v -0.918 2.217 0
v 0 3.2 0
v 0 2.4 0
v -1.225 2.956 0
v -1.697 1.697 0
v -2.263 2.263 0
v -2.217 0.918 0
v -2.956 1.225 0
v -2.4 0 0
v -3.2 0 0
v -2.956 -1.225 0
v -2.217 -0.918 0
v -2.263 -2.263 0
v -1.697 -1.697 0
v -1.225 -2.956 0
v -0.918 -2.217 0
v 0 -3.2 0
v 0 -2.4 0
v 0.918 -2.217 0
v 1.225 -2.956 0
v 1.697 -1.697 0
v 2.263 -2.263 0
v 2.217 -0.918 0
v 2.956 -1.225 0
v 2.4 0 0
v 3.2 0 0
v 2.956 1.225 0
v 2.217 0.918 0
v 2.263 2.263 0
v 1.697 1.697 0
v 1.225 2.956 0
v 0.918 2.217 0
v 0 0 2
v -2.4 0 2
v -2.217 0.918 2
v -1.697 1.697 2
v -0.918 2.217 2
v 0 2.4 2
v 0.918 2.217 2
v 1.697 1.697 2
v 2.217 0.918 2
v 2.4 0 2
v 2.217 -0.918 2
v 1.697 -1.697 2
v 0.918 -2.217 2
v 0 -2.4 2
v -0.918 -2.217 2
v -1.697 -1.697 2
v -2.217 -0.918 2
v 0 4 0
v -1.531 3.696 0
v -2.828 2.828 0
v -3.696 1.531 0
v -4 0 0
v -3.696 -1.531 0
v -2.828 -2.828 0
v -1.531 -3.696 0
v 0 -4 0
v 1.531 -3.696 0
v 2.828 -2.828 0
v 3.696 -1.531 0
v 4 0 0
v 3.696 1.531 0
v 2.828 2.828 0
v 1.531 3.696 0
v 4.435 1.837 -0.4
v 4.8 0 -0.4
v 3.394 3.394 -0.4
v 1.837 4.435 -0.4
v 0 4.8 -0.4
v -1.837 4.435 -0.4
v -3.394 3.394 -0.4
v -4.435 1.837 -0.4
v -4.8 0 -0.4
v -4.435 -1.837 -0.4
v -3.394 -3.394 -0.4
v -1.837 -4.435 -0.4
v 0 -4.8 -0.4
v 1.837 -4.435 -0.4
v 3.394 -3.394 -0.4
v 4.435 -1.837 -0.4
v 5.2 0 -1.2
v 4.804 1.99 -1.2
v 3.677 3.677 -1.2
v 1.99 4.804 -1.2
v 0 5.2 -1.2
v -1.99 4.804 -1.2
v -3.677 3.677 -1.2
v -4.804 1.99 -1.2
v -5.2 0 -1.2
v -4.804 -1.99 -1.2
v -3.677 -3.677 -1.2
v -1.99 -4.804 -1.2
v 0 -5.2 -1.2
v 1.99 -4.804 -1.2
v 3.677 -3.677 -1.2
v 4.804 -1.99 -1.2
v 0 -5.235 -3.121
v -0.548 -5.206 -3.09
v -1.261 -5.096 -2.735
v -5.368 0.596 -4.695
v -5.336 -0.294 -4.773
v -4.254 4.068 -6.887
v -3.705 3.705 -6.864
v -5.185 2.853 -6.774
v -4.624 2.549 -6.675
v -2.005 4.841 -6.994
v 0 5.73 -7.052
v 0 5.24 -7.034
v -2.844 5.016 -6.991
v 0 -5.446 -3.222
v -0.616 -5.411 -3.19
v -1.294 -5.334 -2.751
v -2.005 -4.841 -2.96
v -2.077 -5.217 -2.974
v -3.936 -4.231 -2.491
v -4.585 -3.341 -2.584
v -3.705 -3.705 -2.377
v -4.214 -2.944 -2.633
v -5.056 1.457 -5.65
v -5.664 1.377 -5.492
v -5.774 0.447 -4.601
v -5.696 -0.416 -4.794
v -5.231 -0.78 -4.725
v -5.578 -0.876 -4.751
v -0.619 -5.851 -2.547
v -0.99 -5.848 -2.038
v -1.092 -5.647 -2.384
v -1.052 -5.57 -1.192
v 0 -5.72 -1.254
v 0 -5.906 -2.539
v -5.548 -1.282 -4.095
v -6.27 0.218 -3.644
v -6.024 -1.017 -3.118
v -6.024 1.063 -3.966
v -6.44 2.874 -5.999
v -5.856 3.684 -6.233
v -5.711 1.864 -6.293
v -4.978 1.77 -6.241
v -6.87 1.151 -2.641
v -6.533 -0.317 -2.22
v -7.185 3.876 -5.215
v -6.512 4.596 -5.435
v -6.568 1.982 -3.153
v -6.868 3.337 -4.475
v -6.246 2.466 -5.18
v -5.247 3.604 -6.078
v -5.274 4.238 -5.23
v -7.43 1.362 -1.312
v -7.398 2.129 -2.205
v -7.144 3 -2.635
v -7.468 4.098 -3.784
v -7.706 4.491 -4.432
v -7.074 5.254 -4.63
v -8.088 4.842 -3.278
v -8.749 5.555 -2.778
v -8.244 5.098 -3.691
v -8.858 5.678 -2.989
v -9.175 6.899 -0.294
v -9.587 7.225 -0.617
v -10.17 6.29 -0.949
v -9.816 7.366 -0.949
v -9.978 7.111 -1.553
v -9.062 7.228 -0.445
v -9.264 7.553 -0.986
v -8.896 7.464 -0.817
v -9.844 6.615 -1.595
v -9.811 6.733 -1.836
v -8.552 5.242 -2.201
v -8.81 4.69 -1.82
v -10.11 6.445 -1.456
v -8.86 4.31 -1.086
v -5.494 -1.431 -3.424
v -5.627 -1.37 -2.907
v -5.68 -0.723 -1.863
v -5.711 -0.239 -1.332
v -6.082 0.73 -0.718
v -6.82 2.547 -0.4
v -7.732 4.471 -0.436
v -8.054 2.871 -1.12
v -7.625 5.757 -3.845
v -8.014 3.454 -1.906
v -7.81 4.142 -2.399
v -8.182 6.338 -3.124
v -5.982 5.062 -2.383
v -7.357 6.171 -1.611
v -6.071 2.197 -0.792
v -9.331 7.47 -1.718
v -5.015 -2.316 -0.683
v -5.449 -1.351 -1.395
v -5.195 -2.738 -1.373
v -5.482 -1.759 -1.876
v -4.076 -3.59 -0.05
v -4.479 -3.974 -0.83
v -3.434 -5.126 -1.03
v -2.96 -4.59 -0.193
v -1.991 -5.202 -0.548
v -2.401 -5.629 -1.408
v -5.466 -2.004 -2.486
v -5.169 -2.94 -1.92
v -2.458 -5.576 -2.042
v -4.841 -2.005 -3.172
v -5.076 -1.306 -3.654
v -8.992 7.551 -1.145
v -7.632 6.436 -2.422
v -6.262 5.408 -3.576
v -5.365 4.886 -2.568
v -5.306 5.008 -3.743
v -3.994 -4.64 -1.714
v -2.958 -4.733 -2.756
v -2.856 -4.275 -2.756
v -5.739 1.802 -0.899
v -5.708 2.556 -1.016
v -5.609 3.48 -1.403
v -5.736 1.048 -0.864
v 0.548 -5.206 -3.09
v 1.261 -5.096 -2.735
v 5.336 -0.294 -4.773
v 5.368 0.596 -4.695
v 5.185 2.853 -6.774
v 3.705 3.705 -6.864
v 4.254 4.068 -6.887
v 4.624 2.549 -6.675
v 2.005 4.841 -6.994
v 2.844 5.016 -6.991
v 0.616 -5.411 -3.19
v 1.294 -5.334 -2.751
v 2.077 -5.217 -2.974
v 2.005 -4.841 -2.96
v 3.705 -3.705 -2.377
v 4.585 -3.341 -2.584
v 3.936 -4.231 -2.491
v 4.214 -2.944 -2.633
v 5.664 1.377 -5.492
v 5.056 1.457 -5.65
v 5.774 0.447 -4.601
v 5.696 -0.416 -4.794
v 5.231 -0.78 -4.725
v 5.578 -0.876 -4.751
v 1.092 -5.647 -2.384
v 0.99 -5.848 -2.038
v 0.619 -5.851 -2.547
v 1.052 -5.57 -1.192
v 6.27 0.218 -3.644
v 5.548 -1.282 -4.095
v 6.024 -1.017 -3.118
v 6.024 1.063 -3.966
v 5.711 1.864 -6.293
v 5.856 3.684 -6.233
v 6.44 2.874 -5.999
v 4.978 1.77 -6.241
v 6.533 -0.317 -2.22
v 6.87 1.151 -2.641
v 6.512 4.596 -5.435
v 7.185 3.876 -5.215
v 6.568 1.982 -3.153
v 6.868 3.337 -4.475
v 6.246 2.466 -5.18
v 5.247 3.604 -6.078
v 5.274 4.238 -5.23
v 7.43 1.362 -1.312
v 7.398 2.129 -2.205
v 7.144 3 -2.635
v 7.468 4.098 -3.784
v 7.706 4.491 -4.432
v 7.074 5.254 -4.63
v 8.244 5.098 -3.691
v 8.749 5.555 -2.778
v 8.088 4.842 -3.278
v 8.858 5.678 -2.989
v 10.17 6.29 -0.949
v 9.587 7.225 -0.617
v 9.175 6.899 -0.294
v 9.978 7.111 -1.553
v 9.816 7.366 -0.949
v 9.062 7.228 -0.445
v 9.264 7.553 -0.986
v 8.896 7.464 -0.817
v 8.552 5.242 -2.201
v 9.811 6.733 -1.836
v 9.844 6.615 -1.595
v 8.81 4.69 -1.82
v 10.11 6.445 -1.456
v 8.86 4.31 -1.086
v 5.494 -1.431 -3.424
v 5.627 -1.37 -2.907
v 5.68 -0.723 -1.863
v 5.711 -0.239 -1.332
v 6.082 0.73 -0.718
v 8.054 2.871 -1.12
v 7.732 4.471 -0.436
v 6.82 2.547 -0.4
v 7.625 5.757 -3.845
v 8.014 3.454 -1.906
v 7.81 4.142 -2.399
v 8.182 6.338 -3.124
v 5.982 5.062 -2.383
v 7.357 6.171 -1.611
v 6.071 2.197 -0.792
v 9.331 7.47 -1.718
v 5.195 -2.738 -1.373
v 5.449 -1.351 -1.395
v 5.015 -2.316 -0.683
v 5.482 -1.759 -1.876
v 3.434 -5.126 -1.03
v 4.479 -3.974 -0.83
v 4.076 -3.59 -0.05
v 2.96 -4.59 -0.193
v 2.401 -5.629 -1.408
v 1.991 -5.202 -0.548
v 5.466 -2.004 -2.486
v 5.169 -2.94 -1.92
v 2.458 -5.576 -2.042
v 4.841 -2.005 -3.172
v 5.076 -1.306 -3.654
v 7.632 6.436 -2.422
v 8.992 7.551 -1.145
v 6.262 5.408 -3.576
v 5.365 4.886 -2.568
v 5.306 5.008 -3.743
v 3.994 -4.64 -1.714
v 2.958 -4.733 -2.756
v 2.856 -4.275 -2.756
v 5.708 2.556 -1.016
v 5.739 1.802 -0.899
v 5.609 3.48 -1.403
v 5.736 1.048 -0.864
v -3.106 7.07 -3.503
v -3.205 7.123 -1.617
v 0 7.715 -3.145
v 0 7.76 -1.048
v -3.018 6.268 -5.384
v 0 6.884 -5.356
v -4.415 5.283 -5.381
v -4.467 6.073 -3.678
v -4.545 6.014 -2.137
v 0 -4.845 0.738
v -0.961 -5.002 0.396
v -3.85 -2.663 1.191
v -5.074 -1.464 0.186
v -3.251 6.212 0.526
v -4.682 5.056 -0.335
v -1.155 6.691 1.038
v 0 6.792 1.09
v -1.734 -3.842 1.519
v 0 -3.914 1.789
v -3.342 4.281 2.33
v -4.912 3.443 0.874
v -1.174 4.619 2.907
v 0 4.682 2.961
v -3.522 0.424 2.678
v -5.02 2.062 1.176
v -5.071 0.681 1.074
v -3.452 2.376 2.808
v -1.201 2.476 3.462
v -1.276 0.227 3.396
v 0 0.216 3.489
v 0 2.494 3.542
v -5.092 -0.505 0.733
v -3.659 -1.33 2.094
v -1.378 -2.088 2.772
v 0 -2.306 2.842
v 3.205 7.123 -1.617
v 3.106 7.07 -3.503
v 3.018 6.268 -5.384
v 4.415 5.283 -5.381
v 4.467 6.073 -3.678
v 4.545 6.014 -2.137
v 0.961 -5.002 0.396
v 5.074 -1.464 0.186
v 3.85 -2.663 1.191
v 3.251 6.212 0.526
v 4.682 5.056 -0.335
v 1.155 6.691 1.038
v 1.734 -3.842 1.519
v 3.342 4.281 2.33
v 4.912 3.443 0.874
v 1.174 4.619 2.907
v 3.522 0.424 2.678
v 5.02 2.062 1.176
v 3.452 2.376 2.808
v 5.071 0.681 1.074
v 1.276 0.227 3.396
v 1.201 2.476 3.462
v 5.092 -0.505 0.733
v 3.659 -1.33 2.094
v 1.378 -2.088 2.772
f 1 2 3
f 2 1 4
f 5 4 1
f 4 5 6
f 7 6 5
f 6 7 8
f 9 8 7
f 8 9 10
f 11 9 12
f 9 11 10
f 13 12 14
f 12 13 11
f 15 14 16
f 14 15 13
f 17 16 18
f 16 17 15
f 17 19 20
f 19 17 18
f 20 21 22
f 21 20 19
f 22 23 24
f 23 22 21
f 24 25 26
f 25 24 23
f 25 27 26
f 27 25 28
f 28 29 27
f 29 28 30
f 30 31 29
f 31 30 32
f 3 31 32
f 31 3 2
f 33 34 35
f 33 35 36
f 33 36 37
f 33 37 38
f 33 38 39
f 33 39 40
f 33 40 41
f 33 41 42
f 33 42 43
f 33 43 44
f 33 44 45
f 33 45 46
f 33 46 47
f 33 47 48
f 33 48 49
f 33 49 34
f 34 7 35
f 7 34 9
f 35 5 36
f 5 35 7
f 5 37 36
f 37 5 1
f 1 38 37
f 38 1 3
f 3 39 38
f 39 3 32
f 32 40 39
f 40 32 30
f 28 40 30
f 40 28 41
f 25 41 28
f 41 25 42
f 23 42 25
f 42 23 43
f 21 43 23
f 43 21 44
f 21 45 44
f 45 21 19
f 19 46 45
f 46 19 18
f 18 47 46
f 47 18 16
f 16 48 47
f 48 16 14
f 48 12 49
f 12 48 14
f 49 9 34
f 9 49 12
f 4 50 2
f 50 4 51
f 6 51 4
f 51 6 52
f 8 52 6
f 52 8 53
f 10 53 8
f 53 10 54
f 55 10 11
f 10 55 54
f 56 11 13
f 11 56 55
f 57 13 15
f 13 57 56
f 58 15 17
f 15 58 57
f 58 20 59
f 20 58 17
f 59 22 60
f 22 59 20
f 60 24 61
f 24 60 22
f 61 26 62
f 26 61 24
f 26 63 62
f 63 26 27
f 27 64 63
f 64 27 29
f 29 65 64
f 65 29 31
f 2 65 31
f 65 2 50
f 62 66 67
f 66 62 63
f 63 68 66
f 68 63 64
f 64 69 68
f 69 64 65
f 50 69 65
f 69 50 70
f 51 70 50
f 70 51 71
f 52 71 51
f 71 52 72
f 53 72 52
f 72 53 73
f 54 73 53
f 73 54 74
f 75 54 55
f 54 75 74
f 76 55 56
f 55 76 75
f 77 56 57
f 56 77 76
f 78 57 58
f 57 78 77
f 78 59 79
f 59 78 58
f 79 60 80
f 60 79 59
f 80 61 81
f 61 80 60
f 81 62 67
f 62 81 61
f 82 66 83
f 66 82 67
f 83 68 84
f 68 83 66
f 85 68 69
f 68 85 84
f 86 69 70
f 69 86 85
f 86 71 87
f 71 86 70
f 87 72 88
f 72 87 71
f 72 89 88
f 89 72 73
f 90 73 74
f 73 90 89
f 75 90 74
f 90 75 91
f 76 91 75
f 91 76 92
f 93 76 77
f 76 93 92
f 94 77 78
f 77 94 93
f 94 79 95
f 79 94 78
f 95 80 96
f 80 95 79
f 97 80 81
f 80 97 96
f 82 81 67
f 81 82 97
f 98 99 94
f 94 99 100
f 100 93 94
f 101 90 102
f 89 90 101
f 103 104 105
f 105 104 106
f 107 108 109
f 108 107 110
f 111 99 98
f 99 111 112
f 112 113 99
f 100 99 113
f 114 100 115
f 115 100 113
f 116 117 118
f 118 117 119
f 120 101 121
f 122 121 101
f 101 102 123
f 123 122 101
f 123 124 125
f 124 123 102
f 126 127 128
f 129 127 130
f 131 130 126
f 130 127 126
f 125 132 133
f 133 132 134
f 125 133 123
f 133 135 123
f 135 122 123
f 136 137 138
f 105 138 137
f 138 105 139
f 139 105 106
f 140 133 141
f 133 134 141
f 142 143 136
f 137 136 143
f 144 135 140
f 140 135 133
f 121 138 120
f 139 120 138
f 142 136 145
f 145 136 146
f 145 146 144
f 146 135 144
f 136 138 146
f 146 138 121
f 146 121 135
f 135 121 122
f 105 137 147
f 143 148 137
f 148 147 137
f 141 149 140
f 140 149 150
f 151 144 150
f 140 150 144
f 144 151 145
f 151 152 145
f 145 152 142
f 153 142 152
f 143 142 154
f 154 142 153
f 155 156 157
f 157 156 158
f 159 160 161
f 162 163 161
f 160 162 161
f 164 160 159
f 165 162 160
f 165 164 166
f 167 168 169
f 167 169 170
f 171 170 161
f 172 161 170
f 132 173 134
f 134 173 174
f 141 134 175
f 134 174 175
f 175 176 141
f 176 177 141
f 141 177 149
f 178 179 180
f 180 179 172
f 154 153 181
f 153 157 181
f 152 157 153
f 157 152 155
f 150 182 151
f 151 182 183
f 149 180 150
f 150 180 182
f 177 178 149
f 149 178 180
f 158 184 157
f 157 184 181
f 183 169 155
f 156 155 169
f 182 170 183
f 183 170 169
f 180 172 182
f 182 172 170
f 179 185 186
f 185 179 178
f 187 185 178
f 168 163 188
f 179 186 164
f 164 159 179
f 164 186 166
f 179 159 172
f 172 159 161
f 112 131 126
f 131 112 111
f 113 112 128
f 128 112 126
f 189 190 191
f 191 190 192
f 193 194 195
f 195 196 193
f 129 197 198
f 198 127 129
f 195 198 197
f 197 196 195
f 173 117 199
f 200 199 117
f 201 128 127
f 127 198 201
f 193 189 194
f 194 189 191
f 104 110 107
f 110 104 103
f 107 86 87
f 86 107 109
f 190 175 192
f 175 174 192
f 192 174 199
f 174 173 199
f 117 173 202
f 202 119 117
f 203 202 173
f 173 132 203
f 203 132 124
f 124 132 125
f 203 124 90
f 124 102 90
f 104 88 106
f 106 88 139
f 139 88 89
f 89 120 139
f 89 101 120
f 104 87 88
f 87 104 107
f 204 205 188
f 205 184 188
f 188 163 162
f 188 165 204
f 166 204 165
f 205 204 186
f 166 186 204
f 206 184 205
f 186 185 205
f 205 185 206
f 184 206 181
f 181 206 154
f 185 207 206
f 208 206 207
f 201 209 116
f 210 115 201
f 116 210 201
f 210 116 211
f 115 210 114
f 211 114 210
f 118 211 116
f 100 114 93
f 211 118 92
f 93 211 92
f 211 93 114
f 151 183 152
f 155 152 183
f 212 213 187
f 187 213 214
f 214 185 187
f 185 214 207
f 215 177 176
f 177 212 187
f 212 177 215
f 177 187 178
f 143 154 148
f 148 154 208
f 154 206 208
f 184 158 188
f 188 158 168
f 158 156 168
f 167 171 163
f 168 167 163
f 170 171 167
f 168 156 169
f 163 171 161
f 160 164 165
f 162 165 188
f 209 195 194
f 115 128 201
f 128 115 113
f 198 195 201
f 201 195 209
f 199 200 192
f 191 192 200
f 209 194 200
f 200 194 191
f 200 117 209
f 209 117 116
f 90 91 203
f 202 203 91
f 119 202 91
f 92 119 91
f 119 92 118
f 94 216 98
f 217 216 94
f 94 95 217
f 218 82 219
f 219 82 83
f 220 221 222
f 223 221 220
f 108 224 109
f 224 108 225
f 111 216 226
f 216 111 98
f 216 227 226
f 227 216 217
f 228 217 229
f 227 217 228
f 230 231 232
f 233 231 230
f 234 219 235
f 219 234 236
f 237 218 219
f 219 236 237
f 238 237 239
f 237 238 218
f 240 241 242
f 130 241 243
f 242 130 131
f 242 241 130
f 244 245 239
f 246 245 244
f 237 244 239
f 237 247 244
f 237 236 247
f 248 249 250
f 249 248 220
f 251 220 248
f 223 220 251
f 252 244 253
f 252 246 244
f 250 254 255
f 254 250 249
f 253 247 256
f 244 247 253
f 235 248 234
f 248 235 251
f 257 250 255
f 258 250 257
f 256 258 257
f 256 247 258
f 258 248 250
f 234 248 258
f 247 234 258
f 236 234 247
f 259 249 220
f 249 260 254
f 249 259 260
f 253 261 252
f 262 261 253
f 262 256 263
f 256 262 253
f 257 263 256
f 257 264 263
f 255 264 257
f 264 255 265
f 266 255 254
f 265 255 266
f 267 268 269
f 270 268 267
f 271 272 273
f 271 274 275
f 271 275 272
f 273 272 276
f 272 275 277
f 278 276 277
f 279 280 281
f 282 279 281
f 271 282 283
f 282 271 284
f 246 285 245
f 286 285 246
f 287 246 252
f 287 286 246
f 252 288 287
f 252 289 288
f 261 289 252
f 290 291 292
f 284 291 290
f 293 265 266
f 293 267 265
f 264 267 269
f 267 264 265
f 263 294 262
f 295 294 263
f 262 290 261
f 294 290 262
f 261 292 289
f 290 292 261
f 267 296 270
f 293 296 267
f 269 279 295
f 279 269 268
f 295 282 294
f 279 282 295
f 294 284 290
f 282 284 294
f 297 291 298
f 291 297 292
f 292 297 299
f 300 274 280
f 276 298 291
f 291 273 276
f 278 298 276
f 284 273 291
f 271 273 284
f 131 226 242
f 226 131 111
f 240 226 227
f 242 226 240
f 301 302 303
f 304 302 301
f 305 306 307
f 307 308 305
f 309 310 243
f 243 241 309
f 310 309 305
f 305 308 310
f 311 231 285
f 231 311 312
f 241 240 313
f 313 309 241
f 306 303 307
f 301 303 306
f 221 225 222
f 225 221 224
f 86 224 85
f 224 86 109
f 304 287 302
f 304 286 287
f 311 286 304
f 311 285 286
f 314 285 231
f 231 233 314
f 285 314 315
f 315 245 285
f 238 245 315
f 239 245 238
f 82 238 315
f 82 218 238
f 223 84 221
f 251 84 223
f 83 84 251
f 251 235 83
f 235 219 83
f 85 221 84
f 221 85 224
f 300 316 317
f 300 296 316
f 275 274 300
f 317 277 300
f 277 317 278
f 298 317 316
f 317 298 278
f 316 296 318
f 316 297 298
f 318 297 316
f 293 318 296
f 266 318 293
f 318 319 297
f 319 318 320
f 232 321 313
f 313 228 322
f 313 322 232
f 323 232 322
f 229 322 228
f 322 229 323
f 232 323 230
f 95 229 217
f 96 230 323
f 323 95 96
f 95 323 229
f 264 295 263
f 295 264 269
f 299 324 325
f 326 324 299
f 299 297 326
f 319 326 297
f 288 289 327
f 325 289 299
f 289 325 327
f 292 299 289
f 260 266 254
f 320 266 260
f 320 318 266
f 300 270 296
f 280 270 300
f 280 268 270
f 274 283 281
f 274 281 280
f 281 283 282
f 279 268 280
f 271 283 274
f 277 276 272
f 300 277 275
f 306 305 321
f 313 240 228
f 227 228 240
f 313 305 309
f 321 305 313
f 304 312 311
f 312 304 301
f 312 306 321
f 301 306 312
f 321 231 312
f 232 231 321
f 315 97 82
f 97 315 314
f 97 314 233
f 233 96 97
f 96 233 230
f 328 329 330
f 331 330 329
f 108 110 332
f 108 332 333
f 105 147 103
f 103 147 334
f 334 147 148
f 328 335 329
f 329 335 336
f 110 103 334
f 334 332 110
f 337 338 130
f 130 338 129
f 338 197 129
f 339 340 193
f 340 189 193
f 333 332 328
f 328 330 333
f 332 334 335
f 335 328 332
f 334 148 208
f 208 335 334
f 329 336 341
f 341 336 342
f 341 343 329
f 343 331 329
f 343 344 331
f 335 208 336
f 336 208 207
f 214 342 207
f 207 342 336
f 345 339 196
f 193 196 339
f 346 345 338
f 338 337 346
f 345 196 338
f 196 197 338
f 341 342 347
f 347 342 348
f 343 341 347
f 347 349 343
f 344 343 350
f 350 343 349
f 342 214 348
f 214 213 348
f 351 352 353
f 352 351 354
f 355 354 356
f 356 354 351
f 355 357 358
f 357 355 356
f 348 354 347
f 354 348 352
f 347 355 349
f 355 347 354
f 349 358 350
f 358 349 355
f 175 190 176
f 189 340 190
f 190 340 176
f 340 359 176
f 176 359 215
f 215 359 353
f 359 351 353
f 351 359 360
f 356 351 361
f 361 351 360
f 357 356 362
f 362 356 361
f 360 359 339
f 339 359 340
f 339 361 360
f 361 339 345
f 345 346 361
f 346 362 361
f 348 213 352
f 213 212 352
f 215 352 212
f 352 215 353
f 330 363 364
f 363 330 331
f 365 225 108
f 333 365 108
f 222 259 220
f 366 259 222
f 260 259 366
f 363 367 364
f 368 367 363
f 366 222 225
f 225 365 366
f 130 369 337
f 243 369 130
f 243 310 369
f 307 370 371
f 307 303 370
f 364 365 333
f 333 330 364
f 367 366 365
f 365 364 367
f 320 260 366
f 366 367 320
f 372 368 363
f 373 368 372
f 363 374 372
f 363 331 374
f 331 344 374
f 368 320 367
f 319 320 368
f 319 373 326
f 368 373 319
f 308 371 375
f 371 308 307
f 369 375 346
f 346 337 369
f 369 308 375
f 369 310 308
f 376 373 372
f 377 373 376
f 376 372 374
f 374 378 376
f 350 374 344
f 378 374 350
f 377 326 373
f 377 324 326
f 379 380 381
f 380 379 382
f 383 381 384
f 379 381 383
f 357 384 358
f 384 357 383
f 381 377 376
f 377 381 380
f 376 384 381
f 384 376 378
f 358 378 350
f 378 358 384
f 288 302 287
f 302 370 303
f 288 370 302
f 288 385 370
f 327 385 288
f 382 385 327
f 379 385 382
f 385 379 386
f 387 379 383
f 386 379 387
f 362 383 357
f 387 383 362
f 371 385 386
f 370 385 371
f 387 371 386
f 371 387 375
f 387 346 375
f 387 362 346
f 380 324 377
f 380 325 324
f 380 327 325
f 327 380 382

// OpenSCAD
use <../lib.scad>
use <s/11418s01.scad>
use <s/11418s03.scad>
function ldraw_lib__11418() = [
// 0 Minifig Headdress Bald with Large Pointed Ears
// 0 Name: 11418.dat
// 0 Author: Gerald Lasser [GeraldLasser]
// 0 !LDRAW_ORG Part UPDATE 2023-07
// 0 !LICENSE Licensed under CC BY 4.0 : see CAreadme.txt
// 
// 0 BFC CERTIFY CCW
  [0,"BFC","CERTIFY"],
  [0,"BFC","CCW"],
// 
// 0 !CATEGORY Minifig Headwear
// 0 !KEYWORDS Goblin
// 
// 0 !HISTORY 2013-08-14 {LEGO Digital Designer} Original part shape
// 0 !HISTORY 2023-07-08 [GeraldLasser] File preparation for LDraw Parts Tracker
// 0 !HISTORY 2023-12-31 [OrionP] Official Update 2023-07
// 
// 
// 1 16 0 0 0 1 0 0 0 1 0 0 0 1 s\11418s01.dat
  [1,16,0,0,0,1,0,0,0,1,0,0,0,1, ldraw_lib__s__11418s01()],
// 
// 1 16 0 0 0 1 0 0 0 1 0 0 0 1 s\11418s03.dat
  [1,16,0,0,0,1,0,0,0,1,0,0,0,1, ldraw_lib__s__11418s03()],
// 1 16 0 0 0 -1 0 0 0 1 0 0 0 1 s\11418s03.dat
  [1,16,0,0,0,-1,0,0,0,1,0,0,0,1, ldraw_lib__s__11418s03()],
];
module ldraw_lib__11418(step=0, col=false, unit=2/5, alt=false, line=0.2, solid=!$preview)
    makepoly(ldraw_lib__11418(), step=step, col=col, unit=unit, alt=alt, line=line, solid=solid);
ldraw_lib__11418(line=0.2);
